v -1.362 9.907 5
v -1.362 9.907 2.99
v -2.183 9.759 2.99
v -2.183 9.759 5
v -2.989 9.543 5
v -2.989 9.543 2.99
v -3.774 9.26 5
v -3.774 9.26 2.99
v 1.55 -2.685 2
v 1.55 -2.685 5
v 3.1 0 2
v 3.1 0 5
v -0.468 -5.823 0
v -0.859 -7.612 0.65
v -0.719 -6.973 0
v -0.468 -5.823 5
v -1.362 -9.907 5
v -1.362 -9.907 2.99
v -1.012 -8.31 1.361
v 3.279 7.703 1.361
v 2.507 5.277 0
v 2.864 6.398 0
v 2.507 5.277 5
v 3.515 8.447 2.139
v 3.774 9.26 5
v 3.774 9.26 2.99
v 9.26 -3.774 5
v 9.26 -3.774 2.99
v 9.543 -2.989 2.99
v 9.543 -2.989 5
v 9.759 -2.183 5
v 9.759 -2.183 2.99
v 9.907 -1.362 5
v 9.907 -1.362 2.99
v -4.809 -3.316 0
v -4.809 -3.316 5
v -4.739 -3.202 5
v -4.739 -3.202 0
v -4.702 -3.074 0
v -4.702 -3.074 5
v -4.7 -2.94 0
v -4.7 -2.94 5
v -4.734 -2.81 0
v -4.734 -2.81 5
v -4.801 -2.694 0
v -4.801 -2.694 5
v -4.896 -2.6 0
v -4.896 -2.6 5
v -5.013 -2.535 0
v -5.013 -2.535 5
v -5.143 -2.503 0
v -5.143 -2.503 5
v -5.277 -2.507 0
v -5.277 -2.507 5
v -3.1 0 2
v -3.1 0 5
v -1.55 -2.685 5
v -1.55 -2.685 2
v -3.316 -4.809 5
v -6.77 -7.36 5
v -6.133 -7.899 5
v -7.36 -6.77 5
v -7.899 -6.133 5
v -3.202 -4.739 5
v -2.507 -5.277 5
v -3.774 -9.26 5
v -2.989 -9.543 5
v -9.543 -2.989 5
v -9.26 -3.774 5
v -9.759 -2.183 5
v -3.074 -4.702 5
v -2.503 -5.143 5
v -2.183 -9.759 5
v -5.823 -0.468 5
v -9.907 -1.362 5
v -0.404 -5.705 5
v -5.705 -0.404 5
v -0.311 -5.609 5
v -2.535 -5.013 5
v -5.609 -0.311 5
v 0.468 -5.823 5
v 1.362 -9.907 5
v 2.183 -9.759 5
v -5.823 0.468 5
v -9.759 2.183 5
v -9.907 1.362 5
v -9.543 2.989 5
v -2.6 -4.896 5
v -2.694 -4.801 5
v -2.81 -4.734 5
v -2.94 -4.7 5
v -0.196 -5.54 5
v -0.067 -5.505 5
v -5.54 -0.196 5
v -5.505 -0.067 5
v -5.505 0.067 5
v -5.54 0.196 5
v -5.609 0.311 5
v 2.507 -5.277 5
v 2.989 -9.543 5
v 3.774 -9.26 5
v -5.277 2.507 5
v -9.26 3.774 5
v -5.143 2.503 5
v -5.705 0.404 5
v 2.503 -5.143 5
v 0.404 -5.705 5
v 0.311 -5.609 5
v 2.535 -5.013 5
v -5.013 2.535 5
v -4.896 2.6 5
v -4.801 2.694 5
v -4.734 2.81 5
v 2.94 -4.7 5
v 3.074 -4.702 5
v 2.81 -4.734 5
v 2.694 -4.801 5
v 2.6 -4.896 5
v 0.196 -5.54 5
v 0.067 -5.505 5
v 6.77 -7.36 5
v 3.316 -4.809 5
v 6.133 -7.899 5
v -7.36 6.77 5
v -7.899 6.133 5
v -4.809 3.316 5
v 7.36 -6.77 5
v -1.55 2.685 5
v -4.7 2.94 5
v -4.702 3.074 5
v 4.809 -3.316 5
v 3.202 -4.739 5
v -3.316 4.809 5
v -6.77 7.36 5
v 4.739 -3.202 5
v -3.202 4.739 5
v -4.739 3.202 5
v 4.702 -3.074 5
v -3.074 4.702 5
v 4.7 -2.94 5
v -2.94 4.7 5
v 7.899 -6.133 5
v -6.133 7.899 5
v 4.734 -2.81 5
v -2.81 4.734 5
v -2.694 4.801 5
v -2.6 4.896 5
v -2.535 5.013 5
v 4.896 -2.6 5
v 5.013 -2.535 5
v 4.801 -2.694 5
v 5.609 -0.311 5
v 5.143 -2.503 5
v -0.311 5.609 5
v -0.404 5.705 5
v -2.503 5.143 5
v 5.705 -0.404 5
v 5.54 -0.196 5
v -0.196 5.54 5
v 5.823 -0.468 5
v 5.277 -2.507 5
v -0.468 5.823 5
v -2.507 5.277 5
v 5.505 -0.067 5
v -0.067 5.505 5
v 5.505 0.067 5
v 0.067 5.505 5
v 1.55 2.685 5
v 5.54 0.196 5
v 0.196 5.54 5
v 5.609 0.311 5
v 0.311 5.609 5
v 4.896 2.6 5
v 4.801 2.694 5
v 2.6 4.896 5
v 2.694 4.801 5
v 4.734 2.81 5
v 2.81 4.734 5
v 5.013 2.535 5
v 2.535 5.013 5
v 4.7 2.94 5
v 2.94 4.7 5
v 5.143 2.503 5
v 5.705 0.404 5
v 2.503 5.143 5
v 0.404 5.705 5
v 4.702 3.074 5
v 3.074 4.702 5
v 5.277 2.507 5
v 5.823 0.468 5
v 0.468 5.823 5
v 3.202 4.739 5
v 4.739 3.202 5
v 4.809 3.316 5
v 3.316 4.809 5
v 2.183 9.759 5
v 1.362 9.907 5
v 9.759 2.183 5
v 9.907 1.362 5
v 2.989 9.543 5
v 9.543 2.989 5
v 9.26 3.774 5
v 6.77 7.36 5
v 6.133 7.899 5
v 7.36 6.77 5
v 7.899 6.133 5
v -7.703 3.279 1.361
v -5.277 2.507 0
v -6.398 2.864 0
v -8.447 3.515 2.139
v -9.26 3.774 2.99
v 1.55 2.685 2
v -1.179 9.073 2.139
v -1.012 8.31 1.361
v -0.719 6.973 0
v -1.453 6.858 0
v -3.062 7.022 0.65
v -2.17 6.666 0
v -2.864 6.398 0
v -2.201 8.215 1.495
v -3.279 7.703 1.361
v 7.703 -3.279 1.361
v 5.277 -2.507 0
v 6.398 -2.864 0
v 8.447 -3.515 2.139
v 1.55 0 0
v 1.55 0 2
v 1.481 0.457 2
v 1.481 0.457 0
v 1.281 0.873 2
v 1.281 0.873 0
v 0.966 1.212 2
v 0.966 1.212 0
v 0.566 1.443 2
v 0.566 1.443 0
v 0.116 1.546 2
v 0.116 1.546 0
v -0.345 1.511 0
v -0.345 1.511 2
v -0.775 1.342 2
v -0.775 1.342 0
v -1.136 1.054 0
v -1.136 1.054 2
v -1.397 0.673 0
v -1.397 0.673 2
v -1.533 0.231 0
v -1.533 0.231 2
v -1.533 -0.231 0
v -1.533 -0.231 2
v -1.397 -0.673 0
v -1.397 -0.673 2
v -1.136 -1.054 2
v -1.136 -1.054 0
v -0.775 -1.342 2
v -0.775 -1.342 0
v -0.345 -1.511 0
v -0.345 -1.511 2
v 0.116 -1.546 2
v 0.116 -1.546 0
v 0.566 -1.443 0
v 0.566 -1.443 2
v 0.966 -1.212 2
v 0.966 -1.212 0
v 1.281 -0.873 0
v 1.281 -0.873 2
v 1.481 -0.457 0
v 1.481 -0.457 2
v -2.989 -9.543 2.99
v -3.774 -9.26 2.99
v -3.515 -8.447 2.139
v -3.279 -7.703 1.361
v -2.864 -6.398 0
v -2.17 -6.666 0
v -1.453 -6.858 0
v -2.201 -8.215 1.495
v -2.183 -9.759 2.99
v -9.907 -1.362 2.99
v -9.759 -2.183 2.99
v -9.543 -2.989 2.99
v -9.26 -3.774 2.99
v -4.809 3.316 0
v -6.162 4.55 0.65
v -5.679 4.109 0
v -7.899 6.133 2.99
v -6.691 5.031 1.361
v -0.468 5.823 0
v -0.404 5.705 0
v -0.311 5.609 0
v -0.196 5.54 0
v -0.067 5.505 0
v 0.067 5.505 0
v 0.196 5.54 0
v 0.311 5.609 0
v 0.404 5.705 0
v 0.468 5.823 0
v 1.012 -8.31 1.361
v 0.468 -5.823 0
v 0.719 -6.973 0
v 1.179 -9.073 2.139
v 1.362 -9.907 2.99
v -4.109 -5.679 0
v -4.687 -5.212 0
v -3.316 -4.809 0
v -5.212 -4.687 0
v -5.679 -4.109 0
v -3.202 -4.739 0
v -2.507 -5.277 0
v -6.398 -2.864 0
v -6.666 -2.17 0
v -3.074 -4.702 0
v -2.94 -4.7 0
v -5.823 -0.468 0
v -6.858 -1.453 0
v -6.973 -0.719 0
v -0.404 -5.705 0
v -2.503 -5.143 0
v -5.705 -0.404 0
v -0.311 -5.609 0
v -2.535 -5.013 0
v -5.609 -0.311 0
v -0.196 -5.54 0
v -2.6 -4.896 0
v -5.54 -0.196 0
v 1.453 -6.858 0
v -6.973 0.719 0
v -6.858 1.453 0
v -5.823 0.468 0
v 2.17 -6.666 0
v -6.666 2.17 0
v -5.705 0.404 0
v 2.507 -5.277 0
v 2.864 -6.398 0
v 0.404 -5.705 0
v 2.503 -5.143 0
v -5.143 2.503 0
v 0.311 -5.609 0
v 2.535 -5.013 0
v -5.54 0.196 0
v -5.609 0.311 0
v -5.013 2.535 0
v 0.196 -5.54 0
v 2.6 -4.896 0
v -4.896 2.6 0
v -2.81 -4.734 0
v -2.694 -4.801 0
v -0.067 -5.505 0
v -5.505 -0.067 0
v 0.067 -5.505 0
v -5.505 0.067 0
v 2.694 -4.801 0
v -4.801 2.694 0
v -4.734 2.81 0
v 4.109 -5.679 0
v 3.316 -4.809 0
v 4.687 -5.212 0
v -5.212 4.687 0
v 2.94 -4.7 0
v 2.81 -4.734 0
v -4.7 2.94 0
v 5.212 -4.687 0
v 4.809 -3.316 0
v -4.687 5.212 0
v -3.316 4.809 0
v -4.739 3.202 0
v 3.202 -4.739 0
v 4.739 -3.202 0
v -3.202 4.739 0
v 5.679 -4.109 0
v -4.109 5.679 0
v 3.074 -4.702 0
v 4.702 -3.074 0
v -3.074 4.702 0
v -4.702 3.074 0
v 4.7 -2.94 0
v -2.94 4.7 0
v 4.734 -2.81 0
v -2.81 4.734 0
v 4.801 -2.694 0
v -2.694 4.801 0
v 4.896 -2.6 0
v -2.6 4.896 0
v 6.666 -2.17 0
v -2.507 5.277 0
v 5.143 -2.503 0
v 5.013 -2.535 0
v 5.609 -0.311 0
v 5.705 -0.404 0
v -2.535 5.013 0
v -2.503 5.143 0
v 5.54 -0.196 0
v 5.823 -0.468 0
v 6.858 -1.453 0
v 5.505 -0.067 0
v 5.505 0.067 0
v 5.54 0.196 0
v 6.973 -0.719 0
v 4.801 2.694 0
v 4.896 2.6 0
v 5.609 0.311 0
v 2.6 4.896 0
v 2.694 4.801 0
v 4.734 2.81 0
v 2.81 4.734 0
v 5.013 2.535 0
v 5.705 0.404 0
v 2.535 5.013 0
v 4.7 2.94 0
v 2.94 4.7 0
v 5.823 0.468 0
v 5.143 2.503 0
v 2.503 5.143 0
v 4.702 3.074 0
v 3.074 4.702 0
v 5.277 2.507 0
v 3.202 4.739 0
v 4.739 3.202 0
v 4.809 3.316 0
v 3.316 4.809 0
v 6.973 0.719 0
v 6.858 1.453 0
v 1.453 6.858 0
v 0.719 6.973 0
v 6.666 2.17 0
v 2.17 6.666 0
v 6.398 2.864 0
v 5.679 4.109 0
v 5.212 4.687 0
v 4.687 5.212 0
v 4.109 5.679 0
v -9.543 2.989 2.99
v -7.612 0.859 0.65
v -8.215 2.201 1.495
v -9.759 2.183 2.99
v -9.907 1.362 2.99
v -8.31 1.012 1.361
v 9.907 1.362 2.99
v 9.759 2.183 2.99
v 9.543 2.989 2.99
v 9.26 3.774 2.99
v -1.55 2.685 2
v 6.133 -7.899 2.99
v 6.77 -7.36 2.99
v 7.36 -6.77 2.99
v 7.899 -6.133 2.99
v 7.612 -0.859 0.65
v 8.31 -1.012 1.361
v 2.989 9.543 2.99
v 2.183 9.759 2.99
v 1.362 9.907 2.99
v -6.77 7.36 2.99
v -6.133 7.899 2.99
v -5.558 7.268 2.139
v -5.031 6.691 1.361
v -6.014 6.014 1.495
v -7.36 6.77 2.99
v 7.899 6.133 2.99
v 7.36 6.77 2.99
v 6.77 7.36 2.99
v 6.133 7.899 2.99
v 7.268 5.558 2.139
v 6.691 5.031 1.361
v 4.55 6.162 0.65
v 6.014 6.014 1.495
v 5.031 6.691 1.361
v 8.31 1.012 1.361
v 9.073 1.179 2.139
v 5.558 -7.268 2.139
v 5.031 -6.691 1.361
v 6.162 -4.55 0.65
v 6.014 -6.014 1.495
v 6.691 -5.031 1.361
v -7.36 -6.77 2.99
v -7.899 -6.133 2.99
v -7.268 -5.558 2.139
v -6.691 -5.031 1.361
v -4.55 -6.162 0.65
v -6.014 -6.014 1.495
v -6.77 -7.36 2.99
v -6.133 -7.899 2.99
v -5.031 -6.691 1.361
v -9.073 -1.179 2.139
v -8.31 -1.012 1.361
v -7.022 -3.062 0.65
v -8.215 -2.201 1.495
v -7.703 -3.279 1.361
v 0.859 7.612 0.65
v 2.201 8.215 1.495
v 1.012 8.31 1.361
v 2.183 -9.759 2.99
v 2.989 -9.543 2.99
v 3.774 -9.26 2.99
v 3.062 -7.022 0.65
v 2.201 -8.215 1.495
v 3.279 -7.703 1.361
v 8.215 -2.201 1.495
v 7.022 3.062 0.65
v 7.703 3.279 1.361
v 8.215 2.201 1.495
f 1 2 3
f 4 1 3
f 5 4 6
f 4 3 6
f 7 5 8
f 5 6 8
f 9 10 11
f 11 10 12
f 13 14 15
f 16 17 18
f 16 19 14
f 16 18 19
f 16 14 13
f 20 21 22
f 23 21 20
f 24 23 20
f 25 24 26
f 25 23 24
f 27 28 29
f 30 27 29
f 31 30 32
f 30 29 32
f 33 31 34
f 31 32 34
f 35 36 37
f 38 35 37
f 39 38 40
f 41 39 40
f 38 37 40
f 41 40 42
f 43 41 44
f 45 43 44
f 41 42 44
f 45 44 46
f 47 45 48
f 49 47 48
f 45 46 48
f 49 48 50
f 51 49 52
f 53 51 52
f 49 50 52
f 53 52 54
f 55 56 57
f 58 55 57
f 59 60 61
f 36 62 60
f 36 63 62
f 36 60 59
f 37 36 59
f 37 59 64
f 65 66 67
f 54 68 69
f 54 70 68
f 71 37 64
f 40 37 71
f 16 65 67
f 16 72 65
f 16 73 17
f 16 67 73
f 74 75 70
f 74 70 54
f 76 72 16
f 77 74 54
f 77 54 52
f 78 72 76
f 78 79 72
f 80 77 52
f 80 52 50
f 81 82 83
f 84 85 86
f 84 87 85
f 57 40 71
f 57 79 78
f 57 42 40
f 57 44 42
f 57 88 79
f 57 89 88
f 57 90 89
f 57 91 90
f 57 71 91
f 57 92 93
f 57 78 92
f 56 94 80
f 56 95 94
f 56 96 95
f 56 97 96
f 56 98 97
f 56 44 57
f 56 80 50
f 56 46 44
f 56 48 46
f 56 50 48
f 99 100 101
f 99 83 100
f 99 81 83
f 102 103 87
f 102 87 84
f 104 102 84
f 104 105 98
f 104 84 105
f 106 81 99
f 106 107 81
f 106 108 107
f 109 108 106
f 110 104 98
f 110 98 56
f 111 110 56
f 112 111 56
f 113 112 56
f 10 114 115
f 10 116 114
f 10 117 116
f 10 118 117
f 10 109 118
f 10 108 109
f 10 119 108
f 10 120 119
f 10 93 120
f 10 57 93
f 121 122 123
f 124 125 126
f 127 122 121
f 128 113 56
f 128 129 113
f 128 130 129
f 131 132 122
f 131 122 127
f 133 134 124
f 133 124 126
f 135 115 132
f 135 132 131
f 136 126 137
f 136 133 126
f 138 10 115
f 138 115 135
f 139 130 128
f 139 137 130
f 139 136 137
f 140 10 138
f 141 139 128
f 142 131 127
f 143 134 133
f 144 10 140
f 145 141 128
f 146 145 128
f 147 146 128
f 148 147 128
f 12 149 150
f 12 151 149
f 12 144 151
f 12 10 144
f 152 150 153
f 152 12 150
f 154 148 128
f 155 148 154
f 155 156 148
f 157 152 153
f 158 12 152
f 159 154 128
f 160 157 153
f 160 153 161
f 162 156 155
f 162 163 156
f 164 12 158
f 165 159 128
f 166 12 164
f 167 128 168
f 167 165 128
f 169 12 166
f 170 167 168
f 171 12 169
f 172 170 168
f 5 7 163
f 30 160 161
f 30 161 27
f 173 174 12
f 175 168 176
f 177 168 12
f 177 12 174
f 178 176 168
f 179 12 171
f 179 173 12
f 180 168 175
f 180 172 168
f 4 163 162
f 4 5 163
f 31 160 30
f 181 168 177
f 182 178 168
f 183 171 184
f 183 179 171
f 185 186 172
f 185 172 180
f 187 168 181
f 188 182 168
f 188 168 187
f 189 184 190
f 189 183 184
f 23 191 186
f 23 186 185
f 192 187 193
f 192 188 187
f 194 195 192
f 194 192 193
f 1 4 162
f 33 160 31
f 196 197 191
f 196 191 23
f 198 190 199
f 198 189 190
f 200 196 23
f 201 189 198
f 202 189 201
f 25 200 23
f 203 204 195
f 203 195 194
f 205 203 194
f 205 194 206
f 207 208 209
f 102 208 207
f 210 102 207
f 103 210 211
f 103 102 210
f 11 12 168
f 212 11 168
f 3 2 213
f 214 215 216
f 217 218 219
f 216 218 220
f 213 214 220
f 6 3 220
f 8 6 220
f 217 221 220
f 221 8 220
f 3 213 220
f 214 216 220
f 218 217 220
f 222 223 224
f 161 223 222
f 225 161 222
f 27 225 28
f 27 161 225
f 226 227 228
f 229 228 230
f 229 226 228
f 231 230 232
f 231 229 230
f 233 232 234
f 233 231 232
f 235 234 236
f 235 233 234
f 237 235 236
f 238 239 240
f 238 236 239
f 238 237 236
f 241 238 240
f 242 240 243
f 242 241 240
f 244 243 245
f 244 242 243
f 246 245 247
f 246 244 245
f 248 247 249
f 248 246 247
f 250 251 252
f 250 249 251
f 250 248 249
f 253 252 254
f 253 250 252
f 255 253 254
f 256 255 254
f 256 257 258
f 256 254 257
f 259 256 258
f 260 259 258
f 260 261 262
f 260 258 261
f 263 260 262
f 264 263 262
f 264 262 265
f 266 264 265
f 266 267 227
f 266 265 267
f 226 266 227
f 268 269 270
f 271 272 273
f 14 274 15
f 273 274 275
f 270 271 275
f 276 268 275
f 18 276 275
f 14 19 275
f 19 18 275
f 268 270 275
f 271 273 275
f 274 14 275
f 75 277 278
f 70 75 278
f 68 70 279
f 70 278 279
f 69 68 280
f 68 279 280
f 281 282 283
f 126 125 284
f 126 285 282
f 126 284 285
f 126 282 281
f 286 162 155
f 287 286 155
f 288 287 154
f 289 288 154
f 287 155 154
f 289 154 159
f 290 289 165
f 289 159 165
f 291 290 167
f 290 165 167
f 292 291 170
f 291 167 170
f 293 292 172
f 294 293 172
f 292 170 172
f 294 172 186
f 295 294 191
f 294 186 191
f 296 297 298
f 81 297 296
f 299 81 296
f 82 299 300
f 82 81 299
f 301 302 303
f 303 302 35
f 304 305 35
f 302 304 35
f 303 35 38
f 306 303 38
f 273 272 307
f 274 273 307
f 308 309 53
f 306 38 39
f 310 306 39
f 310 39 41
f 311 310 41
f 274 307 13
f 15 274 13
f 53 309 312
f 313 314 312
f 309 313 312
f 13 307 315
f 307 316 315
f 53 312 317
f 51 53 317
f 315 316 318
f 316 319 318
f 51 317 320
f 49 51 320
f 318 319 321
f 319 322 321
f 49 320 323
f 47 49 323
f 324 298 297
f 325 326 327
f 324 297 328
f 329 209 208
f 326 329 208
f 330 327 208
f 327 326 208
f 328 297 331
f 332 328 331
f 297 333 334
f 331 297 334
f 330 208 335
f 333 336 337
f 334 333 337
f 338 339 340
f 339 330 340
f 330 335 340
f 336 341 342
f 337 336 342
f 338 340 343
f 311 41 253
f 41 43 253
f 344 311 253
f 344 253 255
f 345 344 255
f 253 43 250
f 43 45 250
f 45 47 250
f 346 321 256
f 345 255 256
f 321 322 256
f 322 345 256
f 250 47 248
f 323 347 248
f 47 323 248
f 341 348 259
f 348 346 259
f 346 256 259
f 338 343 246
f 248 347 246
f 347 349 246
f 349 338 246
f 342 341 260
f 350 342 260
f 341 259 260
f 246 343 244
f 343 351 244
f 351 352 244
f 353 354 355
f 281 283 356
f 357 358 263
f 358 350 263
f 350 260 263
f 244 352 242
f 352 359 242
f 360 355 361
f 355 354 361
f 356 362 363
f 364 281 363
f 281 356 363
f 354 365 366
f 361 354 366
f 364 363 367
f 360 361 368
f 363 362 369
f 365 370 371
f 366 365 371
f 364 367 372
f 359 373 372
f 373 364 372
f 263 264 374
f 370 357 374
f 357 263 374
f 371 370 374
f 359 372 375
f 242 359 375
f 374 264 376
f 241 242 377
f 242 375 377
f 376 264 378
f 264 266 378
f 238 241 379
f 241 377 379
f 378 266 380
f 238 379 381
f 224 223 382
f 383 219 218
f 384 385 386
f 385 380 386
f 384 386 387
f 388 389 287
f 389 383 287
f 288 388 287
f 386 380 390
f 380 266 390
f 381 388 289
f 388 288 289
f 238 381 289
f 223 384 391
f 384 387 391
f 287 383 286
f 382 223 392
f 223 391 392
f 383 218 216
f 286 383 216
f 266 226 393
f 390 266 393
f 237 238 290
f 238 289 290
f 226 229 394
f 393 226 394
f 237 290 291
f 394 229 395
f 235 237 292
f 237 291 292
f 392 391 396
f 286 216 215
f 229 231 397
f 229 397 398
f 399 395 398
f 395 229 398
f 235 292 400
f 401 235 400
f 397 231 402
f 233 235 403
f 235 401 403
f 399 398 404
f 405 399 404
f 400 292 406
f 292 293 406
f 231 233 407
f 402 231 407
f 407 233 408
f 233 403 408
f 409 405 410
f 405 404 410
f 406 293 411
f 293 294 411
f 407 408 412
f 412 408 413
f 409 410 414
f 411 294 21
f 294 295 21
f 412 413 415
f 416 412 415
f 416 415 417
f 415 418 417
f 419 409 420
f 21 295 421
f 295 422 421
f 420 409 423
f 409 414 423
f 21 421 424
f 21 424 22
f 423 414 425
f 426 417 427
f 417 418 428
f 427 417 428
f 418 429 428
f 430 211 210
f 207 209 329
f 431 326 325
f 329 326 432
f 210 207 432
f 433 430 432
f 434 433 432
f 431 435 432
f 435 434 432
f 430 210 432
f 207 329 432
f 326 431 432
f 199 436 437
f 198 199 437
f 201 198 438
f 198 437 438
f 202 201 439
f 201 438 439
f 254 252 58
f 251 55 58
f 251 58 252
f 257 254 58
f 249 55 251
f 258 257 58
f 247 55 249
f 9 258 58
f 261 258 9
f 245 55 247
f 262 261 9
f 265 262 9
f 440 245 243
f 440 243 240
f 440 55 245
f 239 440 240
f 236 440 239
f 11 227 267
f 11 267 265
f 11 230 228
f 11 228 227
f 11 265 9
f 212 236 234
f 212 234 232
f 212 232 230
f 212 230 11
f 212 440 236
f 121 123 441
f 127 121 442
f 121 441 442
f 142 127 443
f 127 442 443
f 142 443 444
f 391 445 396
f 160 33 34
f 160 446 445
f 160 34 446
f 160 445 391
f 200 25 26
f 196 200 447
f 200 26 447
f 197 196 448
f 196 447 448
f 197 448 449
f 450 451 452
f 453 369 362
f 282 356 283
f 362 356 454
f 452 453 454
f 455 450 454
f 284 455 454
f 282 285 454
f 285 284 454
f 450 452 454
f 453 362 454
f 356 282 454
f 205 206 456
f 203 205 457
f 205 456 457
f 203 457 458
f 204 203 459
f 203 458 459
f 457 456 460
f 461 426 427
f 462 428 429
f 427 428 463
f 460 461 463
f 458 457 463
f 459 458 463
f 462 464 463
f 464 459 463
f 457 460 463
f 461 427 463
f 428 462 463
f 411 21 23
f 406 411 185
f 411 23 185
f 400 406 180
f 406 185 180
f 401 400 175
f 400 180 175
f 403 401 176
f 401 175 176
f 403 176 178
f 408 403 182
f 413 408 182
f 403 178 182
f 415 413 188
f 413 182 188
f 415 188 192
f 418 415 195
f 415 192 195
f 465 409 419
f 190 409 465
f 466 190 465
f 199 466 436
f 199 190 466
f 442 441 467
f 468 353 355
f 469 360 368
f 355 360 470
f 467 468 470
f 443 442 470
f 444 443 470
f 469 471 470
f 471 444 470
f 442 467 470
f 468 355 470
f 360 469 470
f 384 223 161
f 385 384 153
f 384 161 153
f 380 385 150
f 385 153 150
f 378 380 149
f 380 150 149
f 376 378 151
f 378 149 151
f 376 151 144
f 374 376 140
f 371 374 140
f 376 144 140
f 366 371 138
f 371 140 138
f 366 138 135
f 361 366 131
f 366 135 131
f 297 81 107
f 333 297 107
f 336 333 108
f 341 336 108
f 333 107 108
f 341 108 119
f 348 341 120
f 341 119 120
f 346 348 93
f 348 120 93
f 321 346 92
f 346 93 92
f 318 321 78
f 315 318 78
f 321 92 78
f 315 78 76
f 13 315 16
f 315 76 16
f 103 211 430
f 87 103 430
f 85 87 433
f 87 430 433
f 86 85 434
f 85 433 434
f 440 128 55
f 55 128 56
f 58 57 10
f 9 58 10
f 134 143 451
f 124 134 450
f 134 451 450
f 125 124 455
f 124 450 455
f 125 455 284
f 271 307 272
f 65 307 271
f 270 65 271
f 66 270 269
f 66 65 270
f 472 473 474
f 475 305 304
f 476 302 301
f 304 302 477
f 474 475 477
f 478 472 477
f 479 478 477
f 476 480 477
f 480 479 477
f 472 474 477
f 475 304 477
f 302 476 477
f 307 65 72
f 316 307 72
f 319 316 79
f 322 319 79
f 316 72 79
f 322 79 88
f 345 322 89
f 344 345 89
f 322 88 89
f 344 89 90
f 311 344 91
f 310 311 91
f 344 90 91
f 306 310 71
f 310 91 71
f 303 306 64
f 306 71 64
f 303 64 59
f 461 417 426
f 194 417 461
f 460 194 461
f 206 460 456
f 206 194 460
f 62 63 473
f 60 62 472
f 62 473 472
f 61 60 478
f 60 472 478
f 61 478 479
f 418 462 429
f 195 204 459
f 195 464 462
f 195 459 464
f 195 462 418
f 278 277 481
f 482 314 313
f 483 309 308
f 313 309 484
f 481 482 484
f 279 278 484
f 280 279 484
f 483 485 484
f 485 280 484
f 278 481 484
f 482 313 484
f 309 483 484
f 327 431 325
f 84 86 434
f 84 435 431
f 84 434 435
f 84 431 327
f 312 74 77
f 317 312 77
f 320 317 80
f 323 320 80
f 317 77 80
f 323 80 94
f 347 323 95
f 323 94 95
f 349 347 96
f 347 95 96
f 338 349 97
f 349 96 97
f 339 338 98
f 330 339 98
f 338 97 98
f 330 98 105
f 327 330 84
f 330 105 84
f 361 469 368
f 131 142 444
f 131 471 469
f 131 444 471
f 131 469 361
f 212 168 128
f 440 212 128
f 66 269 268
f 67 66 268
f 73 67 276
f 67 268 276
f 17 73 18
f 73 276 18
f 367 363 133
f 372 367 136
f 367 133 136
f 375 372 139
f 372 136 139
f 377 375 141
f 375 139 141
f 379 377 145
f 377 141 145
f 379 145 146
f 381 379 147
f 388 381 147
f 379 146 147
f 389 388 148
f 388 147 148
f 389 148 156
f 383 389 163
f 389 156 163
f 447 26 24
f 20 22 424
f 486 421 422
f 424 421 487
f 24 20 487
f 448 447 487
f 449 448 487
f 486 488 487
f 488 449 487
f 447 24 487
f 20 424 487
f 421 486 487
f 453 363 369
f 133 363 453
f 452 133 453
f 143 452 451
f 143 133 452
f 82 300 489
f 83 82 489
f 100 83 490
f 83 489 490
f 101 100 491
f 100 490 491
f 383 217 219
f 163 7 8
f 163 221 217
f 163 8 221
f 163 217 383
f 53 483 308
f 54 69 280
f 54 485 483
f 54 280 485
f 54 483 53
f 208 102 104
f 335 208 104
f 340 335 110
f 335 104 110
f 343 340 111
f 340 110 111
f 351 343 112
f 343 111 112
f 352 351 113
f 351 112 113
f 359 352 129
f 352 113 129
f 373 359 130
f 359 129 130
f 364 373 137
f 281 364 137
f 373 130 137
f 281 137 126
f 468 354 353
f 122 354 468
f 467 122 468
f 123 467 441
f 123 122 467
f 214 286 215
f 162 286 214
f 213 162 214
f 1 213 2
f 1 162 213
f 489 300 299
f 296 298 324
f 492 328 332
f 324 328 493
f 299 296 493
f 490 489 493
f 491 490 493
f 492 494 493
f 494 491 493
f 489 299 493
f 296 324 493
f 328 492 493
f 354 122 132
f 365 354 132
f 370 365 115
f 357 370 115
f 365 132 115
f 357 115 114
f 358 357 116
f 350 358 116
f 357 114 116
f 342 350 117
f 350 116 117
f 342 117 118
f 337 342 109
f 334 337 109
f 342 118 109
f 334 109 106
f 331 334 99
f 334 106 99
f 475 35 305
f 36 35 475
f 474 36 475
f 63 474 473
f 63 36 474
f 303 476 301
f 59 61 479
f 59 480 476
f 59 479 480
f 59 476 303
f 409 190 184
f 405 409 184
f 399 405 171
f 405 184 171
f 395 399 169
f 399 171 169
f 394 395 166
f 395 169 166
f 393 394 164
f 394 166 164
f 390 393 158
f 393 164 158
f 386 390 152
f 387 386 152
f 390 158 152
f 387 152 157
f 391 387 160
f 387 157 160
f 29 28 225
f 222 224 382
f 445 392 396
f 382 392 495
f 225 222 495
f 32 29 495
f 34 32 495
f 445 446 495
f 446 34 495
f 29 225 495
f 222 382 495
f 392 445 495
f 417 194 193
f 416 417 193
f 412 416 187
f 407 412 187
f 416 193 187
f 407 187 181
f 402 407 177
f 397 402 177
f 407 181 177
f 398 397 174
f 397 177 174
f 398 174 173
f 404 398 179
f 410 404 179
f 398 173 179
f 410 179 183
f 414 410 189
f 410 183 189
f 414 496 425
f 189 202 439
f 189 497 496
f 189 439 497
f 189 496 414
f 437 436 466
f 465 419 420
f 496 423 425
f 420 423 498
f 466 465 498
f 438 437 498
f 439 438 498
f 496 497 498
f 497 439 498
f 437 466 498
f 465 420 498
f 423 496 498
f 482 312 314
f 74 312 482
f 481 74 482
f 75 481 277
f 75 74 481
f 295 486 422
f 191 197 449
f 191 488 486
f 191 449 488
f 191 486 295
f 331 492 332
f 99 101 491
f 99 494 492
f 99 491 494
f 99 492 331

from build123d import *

# Parameters (mm, degrees)
SKETCH_R           = 10
SKETCH_R_2         = 1.55
PAD_DEPTH          = 5
POCKET_DEPTH       = 3
CHAMFER_SIZE       = 2.99
POCKET001_DEPTH    = 7
POLARPATTERN_COUNT = 12


with BuildPart() as part:
    # Sketch → Pad (new body)
    with BuildSketch(Plane.XY):
        Circle(SKETCH_R)
        Circle(SKETCH_R_2, mode=Mode.SUBTRACT)
    extrude(amount=PAD_DEPTH)

    # Sketch001 (on Face4 of Pad) → Pocket (cut)
    with BuildSketch(Plane.XY.offset(5)):
        Polygon((-1.55, -2.684679), (1.55, -2.684679), (3.1, 0), (1.55, 2.684679), (-1.55, 2.684679), (-3.1, 0), align=None)
    extrude(amount=-POCKET_DEPTH, mode=Mode.SUBTRACT)

    # Chamfer
    chamfer_edges = [part.edges().sort_by_distance(p)[0] for p in [
        (-10, 0, 0),
    ]]
    chamfer(chamfer_edges, length=CHAMFER_SIZE)

    # Sketch002 (on Face3 of Pocket) → Pocket001 (cut)
    with BuildSketch(Plane.XY.offset(5)):
        with BuildLine():
            ThreePointArc((-0.467595, 5.822927), (0, 5.5), (0.467595, 5.822927))
            Line((2, 12.822927), (0.467595, 5.822927))
            Line((-2, 12.822927), (2, 12.822927))
            Line((-0.467595, 5.822927), (-2, 12.822927))
        make_face()
    pocket001 = extrude(amount=-POCKET001_DEPTH, mode=Mode.SUBTRACT)

    # PolarPattern: Pocket001 ×12 about axis
    polarpattern_axis = Axis((0, 0, 5), (0, 0, 1))
    for i in range(1, POLARPATTERN_COUNT):
        add(pocket001.rotate(polarpattern_axis, i * 360 / POLARPATTERN_COUNT), mode=Mode.SUBTRACT)


solid = part.part
